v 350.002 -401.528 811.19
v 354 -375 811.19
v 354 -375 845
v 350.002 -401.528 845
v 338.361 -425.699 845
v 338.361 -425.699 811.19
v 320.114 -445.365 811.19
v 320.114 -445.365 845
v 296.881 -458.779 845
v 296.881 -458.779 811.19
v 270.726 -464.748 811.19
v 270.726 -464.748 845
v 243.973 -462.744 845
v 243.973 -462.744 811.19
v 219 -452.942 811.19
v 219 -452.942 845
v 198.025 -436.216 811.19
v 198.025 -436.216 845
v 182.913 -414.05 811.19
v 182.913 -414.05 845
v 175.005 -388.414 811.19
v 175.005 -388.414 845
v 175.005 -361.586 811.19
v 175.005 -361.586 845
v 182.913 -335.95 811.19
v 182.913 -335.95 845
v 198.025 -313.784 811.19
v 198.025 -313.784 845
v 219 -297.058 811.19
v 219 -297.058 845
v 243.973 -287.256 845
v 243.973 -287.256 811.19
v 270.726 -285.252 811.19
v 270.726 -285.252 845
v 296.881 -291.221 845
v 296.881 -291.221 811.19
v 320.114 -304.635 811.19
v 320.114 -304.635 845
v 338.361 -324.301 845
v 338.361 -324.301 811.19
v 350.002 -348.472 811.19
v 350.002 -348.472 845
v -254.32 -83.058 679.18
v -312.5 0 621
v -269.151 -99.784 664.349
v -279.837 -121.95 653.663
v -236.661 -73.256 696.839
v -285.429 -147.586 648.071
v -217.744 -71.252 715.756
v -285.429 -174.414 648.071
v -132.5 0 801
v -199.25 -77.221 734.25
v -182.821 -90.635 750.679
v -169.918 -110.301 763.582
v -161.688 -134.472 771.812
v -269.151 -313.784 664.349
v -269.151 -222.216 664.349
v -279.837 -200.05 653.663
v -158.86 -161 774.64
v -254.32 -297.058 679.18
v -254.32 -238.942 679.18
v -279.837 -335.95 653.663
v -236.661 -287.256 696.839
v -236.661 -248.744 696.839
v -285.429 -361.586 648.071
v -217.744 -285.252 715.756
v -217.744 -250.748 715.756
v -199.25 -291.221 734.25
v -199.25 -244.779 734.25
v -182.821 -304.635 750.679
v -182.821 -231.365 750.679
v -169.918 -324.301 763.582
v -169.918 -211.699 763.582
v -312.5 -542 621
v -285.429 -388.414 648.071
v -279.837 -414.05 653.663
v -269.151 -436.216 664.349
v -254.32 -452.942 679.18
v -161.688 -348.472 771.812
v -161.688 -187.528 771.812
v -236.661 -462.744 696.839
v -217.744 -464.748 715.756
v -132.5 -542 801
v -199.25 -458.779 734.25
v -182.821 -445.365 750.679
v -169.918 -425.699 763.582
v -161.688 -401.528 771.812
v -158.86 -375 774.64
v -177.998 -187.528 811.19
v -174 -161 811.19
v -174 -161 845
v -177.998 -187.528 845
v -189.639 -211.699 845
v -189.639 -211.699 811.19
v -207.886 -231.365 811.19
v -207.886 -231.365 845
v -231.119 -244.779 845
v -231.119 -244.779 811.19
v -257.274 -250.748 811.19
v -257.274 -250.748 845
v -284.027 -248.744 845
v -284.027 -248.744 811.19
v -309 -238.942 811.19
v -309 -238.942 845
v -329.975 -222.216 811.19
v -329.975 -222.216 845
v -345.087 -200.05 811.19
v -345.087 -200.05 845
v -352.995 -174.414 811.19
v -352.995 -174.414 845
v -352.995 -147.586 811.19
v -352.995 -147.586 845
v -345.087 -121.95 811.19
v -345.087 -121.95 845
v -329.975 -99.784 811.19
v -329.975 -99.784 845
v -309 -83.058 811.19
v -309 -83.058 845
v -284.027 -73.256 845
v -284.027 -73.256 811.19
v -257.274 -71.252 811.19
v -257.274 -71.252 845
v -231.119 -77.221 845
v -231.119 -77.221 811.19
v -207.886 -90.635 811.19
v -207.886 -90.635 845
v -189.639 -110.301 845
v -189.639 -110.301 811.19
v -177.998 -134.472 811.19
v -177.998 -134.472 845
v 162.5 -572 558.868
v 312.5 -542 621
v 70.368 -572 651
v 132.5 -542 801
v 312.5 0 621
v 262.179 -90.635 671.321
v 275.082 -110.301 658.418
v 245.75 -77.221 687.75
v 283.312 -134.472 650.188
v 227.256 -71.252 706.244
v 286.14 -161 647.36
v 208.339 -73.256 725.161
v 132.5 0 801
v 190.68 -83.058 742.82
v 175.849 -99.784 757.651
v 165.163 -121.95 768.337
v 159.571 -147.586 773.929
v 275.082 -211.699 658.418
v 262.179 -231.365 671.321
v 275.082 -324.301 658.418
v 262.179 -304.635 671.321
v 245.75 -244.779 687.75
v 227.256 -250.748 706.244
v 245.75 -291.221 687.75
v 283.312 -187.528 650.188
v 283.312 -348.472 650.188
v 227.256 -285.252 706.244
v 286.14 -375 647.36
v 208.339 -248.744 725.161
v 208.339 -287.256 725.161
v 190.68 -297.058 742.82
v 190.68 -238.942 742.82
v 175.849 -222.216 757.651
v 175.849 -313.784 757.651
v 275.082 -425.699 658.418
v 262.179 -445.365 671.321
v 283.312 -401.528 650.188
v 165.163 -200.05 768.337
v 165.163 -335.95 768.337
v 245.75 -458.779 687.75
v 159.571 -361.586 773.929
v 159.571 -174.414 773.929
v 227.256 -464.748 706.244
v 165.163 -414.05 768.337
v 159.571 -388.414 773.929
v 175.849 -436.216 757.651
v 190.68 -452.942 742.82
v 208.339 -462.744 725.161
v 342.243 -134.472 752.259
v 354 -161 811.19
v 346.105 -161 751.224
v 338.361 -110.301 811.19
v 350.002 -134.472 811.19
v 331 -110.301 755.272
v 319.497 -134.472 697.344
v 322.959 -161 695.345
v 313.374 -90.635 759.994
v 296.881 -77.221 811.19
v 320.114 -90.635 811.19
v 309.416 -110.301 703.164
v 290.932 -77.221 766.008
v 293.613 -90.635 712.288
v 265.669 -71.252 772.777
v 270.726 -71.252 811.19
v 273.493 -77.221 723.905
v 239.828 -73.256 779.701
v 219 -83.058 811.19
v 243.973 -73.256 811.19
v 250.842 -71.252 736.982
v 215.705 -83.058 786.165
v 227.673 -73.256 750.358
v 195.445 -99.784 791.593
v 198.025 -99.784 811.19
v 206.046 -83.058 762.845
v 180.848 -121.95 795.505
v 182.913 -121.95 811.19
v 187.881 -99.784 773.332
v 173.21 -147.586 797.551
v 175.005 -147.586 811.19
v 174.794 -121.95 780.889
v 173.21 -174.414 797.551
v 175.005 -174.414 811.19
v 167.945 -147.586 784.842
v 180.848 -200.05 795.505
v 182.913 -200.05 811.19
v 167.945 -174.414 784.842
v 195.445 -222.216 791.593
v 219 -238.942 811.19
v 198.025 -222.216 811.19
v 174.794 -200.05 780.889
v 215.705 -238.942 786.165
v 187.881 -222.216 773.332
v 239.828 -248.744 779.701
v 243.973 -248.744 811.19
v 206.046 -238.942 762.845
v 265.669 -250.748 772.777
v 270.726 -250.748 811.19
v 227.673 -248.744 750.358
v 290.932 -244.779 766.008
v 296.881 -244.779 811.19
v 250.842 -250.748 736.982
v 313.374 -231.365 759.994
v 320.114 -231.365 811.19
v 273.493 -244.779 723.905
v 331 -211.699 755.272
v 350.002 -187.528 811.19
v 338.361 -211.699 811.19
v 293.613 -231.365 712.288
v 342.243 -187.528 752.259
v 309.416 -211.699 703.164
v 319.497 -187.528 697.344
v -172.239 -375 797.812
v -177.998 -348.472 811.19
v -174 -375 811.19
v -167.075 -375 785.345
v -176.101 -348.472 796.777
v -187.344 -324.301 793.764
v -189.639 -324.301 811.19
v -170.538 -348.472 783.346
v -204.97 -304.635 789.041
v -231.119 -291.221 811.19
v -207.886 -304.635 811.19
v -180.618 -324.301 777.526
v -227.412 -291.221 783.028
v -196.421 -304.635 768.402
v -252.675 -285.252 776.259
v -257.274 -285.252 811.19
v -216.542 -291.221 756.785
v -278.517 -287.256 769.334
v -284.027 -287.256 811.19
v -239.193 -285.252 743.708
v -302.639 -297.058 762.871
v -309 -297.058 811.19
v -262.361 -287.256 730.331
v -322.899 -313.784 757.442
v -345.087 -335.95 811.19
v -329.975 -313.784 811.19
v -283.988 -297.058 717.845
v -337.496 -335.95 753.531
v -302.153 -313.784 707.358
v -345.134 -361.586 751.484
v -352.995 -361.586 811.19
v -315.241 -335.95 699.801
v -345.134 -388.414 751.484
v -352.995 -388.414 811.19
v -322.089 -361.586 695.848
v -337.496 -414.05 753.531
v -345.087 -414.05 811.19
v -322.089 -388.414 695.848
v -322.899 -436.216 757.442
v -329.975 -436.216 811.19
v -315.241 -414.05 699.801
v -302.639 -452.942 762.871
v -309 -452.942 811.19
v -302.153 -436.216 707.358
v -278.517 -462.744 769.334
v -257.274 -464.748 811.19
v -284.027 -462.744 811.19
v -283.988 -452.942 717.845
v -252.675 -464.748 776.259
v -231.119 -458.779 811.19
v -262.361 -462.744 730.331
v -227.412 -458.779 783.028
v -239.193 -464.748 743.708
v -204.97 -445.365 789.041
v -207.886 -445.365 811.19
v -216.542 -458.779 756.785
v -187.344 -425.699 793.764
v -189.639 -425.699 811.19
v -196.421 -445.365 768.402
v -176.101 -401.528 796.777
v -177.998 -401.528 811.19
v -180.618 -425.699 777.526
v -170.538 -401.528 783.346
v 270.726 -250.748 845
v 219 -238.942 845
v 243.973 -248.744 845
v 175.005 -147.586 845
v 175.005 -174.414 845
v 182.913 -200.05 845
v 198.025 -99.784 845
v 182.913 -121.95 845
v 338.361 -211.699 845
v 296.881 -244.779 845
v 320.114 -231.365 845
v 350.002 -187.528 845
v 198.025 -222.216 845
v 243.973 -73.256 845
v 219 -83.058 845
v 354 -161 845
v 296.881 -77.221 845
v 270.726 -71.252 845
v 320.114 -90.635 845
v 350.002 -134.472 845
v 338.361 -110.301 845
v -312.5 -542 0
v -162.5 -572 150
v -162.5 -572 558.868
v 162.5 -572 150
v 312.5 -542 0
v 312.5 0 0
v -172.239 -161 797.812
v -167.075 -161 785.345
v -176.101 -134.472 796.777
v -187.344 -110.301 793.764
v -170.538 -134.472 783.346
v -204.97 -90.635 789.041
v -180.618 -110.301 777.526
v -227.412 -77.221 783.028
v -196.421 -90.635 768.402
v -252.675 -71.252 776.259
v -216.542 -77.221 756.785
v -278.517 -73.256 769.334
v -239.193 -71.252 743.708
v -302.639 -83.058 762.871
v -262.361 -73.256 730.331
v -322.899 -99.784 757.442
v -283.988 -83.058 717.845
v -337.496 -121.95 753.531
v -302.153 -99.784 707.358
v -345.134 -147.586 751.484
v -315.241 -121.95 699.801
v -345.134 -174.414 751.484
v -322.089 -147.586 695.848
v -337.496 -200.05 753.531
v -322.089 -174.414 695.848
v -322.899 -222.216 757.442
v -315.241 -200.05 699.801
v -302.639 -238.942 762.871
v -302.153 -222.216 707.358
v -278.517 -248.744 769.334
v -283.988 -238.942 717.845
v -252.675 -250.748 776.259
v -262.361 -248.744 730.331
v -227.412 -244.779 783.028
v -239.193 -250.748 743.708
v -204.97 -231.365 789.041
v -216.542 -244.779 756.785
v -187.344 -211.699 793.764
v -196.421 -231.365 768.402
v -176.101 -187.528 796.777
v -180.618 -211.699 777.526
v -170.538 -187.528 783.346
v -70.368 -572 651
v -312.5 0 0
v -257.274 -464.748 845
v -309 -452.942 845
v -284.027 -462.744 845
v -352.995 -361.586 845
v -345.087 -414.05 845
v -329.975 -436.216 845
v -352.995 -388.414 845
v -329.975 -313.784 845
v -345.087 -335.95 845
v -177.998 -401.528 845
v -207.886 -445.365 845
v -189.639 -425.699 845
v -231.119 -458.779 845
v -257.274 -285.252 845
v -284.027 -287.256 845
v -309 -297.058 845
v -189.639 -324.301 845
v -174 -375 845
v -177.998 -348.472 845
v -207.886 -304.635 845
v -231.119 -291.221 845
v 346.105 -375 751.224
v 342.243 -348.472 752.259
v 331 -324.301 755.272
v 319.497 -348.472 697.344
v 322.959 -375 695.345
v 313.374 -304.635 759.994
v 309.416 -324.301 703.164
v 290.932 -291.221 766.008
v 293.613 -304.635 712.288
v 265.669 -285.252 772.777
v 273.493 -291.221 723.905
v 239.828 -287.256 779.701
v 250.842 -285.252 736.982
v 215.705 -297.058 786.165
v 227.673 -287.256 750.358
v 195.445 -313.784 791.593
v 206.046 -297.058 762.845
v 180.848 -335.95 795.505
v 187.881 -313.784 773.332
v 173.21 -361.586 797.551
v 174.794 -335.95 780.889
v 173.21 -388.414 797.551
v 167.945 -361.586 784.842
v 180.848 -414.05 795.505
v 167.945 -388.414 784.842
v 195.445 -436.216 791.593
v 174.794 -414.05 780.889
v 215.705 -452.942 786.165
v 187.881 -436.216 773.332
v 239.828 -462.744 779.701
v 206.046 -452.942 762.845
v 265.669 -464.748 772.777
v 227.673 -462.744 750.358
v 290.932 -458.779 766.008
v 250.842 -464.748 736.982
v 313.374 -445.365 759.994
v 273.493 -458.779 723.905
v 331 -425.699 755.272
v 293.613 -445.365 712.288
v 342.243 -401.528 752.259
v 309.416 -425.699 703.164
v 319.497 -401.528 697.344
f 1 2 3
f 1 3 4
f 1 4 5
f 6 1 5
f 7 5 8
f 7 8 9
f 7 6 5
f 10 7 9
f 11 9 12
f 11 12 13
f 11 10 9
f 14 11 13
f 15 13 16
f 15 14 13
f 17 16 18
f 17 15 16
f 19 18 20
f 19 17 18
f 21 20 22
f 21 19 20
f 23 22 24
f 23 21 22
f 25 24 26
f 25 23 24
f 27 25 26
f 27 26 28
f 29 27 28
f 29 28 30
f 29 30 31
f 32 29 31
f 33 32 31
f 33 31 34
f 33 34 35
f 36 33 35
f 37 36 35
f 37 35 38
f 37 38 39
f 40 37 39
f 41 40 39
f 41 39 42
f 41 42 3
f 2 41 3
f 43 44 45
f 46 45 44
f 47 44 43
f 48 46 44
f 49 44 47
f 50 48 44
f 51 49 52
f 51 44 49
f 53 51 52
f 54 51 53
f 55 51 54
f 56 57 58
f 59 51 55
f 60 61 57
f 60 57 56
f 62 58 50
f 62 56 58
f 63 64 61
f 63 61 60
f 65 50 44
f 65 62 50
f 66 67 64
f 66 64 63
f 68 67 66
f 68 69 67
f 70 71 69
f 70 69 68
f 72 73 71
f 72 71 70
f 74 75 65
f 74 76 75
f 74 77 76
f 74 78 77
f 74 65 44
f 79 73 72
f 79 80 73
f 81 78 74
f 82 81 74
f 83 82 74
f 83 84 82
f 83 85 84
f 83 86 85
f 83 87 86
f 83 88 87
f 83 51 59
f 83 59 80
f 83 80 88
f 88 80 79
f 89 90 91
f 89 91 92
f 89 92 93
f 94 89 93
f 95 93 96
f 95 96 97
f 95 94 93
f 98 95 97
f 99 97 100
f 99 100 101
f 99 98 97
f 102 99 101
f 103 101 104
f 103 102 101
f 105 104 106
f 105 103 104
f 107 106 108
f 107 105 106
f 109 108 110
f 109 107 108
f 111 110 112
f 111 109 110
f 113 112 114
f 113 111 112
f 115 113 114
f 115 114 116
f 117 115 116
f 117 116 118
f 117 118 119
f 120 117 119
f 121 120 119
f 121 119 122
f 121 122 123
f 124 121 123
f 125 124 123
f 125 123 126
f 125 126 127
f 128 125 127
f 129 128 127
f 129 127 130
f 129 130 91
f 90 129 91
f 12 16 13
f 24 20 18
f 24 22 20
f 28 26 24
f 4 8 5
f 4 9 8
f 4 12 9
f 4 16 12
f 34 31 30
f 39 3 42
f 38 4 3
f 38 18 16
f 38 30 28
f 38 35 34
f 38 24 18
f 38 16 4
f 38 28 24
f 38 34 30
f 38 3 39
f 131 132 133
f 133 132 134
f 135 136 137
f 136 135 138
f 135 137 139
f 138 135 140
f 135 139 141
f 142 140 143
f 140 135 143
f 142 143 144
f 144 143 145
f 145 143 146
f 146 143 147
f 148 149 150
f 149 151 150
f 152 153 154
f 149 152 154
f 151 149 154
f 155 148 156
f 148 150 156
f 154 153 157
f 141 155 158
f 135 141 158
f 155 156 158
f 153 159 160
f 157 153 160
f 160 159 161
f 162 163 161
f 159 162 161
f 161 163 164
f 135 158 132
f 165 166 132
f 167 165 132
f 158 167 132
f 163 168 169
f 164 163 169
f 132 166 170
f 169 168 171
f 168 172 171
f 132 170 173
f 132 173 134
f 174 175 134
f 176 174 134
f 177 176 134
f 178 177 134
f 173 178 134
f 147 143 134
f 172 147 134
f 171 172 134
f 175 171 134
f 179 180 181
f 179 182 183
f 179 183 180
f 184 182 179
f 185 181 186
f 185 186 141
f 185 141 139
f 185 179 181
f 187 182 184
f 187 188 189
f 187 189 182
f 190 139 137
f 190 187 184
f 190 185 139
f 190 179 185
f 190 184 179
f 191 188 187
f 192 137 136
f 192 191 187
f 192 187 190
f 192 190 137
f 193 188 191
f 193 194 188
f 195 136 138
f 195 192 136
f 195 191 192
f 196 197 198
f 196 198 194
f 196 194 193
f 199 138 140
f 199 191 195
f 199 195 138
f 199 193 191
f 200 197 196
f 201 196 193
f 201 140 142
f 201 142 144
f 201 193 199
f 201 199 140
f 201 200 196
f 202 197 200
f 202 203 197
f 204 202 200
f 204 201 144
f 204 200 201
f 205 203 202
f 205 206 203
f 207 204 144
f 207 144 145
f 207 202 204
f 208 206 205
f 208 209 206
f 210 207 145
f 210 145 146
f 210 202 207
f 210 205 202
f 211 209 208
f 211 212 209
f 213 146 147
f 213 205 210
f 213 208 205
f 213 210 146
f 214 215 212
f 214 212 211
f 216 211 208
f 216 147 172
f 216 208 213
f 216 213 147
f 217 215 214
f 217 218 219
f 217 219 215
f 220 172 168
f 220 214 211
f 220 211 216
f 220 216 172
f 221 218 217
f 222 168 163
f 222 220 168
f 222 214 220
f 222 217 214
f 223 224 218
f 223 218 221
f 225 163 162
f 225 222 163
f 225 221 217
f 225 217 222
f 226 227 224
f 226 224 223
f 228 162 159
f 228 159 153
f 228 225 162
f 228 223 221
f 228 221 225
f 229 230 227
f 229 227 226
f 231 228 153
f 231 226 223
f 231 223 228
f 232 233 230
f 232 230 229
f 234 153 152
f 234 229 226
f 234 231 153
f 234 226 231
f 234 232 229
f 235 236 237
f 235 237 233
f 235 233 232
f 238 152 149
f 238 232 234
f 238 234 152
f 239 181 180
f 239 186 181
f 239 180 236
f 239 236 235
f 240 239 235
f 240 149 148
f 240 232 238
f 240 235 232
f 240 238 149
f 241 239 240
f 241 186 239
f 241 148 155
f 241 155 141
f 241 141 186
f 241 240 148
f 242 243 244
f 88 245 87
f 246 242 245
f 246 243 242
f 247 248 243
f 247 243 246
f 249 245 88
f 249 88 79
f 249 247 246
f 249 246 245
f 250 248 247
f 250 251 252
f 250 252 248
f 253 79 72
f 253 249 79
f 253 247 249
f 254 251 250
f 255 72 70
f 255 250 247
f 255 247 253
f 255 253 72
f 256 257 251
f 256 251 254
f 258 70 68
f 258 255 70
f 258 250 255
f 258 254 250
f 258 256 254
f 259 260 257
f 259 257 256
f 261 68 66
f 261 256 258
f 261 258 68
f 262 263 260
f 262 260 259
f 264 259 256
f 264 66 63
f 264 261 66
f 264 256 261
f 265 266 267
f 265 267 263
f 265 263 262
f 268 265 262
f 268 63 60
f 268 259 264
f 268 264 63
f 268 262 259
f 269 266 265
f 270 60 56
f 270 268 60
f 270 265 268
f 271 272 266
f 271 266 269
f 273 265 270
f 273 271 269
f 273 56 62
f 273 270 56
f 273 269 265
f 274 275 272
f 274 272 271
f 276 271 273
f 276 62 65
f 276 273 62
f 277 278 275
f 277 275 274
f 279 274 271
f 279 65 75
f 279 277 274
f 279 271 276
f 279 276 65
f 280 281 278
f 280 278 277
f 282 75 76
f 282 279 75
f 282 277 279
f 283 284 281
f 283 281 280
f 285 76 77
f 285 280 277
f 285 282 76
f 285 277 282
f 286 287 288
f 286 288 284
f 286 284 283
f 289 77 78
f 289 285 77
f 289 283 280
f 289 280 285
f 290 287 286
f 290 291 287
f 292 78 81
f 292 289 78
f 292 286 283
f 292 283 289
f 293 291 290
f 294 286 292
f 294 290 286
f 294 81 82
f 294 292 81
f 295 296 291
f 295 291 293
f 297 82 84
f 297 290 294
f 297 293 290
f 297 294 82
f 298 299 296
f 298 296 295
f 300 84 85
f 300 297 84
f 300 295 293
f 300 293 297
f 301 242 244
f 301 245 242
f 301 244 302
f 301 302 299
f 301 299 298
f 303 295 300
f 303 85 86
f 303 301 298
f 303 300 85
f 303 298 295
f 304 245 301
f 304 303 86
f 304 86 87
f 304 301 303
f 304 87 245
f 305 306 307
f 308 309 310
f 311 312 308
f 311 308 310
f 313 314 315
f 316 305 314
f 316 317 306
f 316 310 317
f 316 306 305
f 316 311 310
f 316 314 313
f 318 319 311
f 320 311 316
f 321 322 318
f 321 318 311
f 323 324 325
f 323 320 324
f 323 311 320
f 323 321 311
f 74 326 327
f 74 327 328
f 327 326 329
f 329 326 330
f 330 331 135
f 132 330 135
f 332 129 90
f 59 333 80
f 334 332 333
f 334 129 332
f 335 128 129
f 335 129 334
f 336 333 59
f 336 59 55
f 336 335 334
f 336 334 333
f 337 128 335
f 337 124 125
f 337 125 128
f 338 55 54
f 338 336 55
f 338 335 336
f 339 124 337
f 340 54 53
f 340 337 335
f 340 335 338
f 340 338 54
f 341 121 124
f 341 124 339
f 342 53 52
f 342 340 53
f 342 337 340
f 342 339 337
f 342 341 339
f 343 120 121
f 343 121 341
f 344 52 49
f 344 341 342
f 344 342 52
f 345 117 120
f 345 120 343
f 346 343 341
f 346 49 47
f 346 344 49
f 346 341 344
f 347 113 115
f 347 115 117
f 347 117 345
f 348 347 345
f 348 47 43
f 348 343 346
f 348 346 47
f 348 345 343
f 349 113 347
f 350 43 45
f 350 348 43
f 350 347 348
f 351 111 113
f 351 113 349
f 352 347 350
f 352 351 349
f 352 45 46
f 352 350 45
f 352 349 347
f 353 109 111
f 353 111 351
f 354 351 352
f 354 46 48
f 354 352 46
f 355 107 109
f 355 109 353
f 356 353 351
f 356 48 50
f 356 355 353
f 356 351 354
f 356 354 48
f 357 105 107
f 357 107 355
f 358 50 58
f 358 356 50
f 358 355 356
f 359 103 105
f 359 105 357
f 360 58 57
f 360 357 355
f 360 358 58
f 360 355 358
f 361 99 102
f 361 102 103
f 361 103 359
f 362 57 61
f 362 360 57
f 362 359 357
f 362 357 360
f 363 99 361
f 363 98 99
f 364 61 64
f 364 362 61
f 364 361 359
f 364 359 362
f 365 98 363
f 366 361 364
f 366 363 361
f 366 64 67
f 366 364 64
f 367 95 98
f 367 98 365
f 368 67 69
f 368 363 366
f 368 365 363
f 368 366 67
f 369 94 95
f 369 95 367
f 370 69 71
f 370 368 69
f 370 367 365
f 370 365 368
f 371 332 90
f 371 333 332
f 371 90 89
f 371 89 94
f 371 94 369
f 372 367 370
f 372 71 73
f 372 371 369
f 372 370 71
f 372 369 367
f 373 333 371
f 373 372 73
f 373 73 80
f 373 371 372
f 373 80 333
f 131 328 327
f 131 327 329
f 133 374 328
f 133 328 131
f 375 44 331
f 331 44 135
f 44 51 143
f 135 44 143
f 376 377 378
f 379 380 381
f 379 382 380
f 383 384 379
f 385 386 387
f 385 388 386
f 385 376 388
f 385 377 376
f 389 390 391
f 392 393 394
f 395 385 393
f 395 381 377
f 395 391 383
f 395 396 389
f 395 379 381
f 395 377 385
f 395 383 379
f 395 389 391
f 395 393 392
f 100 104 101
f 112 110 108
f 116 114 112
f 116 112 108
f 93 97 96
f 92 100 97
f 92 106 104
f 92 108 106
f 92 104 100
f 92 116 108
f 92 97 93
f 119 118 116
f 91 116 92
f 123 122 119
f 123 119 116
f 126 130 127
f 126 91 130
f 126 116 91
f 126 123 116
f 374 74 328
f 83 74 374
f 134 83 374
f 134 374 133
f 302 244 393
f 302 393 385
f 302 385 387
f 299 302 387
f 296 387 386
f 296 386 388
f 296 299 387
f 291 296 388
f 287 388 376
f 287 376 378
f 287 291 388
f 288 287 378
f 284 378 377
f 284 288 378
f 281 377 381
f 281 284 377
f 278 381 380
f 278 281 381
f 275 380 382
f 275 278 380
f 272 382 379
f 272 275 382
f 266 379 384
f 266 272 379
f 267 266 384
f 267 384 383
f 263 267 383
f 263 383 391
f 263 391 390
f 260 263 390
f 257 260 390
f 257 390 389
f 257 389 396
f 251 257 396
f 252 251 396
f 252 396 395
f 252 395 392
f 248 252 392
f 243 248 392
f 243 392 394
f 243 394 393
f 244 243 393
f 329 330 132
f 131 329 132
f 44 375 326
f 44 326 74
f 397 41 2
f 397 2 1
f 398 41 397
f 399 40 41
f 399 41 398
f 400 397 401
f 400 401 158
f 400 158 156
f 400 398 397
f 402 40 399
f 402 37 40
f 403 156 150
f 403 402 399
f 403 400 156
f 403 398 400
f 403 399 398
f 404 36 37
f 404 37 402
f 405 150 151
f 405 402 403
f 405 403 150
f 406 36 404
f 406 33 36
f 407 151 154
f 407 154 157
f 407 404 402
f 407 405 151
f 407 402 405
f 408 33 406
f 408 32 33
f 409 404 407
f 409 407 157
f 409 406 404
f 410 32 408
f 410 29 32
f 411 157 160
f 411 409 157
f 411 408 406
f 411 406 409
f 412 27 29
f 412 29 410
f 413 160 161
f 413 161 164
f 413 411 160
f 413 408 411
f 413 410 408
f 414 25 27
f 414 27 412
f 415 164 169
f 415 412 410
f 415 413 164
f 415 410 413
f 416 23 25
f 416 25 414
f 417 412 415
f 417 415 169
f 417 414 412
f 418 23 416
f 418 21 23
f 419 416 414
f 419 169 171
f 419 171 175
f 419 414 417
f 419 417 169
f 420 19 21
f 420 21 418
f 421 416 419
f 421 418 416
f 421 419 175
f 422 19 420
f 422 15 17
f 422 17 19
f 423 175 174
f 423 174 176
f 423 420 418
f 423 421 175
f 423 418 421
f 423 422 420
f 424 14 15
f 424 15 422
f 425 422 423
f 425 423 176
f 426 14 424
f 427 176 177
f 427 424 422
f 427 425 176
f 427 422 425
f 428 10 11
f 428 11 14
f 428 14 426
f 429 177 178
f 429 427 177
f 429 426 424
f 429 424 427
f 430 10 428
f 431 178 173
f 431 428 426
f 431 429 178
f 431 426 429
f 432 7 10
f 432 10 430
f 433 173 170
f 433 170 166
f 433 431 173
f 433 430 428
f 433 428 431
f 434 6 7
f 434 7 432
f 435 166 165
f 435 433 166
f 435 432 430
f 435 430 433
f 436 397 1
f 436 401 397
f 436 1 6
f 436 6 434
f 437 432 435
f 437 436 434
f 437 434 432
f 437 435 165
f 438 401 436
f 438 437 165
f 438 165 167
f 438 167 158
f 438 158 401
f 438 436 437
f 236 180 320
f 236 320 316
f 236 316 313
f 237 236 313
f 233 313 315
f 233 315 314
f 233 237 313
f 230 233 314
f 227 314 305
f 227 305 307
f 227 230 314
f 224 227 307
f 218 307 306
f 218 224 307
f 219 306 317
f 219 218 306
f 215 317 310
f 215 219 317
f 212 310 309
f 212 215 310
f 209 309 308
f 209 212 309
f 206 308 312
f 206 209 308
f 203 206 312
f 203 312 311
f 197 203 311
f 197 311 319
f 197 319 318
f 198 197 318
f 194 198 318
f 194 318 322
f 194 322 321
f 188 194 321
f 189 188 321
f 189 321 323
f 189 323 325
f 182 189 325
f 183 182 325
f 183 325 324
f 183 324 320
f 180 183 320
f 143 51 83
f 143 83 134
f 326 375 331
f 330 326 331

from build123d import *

# Parameters (mm, degrees)
F0_W     = 625
F0_H     = 801
F1_DEPTH = 572
F2_SIZE  = 180
F4_R     = 90
F8_SIZE2 = 30
F8_SIZE  = 150


with BuildPart() as f1:
    # F0 (on Front) → F1 (new body)
    with BuildSketch(Plane.XZ):
        with Locations((0, 400.5)):
            Rectangle(F0_W, F0_H)
    extrude(amount=F1_DEPTH)

    # F2
    f2_edges = [f1.edges().sort_by_distance(p)[0] for p in [
        (-312.5, -286, 801),
        (312.5, -286, 801),
    ]]
    chamfer(f2_edges, length=F2_SIZE)

    # F6: sweep along a path in F5
    with BuildLine(Plane(origin=(0, 0, 0), x_dir=(-1, 0, 0), z_dir=(0, 1, 0))) as f6_path:
        Line((-264, 845), (-264, 811.1898628385))
        ThreePointArc((-264, 811.1898628385), (-253.2145014023, 756.9674997961), (-222.5, 711))
    # F4 (on offset) → F6 (sweep)
    with BuildSketch(Plane.XY.offset(845)):
        with Locations((264, -161)):
            Circle(F4_R)
        with Locations((264, -375)):
            Circle(F4_R)
    sweep(path=f6_path.line)

    # F7: sweep along a path in F5
    with BuildLine(Plane(origin=(0, 0, 0), x_dir=(-1, 0, 0), z_dir=(0, 1, 0))) as f7_path:
        Line((264, 845), (264, 811.1898628385))
        ThreePointArc((264, 811.1898628385), (253.2145014023, 756.9674997961), (222.5, 711))
    # F4 (on offset) → F7 (sweep)
    with BuildSketch(Plane.XY.offset(845)):
        with Locations((-264, -375)):
            Circle(F4_R)
        with Locations((-264, -161)):
            Circle(F4_R)
    sweep(path=f7_path.line)

    # F8
    f8_edges = [f1.edges().sort_by_distance(p)[0] for p in [
        (-312.5, -572, 310.5),
        (-222.5, -572, 711),
        (0, -572, 0),
        (0, -572, 801),
        (312.5, -572, 310.5),
        (222.5, -572, 711),
    ]]
    f8_side = f1.faces().sort_by_distance((0, -572, 376.938251))[0]
    chamfer(f8_edges, length=F8_SIZE, length2=F8_SIZE2, reference=f8_side)


solid = f1.part
